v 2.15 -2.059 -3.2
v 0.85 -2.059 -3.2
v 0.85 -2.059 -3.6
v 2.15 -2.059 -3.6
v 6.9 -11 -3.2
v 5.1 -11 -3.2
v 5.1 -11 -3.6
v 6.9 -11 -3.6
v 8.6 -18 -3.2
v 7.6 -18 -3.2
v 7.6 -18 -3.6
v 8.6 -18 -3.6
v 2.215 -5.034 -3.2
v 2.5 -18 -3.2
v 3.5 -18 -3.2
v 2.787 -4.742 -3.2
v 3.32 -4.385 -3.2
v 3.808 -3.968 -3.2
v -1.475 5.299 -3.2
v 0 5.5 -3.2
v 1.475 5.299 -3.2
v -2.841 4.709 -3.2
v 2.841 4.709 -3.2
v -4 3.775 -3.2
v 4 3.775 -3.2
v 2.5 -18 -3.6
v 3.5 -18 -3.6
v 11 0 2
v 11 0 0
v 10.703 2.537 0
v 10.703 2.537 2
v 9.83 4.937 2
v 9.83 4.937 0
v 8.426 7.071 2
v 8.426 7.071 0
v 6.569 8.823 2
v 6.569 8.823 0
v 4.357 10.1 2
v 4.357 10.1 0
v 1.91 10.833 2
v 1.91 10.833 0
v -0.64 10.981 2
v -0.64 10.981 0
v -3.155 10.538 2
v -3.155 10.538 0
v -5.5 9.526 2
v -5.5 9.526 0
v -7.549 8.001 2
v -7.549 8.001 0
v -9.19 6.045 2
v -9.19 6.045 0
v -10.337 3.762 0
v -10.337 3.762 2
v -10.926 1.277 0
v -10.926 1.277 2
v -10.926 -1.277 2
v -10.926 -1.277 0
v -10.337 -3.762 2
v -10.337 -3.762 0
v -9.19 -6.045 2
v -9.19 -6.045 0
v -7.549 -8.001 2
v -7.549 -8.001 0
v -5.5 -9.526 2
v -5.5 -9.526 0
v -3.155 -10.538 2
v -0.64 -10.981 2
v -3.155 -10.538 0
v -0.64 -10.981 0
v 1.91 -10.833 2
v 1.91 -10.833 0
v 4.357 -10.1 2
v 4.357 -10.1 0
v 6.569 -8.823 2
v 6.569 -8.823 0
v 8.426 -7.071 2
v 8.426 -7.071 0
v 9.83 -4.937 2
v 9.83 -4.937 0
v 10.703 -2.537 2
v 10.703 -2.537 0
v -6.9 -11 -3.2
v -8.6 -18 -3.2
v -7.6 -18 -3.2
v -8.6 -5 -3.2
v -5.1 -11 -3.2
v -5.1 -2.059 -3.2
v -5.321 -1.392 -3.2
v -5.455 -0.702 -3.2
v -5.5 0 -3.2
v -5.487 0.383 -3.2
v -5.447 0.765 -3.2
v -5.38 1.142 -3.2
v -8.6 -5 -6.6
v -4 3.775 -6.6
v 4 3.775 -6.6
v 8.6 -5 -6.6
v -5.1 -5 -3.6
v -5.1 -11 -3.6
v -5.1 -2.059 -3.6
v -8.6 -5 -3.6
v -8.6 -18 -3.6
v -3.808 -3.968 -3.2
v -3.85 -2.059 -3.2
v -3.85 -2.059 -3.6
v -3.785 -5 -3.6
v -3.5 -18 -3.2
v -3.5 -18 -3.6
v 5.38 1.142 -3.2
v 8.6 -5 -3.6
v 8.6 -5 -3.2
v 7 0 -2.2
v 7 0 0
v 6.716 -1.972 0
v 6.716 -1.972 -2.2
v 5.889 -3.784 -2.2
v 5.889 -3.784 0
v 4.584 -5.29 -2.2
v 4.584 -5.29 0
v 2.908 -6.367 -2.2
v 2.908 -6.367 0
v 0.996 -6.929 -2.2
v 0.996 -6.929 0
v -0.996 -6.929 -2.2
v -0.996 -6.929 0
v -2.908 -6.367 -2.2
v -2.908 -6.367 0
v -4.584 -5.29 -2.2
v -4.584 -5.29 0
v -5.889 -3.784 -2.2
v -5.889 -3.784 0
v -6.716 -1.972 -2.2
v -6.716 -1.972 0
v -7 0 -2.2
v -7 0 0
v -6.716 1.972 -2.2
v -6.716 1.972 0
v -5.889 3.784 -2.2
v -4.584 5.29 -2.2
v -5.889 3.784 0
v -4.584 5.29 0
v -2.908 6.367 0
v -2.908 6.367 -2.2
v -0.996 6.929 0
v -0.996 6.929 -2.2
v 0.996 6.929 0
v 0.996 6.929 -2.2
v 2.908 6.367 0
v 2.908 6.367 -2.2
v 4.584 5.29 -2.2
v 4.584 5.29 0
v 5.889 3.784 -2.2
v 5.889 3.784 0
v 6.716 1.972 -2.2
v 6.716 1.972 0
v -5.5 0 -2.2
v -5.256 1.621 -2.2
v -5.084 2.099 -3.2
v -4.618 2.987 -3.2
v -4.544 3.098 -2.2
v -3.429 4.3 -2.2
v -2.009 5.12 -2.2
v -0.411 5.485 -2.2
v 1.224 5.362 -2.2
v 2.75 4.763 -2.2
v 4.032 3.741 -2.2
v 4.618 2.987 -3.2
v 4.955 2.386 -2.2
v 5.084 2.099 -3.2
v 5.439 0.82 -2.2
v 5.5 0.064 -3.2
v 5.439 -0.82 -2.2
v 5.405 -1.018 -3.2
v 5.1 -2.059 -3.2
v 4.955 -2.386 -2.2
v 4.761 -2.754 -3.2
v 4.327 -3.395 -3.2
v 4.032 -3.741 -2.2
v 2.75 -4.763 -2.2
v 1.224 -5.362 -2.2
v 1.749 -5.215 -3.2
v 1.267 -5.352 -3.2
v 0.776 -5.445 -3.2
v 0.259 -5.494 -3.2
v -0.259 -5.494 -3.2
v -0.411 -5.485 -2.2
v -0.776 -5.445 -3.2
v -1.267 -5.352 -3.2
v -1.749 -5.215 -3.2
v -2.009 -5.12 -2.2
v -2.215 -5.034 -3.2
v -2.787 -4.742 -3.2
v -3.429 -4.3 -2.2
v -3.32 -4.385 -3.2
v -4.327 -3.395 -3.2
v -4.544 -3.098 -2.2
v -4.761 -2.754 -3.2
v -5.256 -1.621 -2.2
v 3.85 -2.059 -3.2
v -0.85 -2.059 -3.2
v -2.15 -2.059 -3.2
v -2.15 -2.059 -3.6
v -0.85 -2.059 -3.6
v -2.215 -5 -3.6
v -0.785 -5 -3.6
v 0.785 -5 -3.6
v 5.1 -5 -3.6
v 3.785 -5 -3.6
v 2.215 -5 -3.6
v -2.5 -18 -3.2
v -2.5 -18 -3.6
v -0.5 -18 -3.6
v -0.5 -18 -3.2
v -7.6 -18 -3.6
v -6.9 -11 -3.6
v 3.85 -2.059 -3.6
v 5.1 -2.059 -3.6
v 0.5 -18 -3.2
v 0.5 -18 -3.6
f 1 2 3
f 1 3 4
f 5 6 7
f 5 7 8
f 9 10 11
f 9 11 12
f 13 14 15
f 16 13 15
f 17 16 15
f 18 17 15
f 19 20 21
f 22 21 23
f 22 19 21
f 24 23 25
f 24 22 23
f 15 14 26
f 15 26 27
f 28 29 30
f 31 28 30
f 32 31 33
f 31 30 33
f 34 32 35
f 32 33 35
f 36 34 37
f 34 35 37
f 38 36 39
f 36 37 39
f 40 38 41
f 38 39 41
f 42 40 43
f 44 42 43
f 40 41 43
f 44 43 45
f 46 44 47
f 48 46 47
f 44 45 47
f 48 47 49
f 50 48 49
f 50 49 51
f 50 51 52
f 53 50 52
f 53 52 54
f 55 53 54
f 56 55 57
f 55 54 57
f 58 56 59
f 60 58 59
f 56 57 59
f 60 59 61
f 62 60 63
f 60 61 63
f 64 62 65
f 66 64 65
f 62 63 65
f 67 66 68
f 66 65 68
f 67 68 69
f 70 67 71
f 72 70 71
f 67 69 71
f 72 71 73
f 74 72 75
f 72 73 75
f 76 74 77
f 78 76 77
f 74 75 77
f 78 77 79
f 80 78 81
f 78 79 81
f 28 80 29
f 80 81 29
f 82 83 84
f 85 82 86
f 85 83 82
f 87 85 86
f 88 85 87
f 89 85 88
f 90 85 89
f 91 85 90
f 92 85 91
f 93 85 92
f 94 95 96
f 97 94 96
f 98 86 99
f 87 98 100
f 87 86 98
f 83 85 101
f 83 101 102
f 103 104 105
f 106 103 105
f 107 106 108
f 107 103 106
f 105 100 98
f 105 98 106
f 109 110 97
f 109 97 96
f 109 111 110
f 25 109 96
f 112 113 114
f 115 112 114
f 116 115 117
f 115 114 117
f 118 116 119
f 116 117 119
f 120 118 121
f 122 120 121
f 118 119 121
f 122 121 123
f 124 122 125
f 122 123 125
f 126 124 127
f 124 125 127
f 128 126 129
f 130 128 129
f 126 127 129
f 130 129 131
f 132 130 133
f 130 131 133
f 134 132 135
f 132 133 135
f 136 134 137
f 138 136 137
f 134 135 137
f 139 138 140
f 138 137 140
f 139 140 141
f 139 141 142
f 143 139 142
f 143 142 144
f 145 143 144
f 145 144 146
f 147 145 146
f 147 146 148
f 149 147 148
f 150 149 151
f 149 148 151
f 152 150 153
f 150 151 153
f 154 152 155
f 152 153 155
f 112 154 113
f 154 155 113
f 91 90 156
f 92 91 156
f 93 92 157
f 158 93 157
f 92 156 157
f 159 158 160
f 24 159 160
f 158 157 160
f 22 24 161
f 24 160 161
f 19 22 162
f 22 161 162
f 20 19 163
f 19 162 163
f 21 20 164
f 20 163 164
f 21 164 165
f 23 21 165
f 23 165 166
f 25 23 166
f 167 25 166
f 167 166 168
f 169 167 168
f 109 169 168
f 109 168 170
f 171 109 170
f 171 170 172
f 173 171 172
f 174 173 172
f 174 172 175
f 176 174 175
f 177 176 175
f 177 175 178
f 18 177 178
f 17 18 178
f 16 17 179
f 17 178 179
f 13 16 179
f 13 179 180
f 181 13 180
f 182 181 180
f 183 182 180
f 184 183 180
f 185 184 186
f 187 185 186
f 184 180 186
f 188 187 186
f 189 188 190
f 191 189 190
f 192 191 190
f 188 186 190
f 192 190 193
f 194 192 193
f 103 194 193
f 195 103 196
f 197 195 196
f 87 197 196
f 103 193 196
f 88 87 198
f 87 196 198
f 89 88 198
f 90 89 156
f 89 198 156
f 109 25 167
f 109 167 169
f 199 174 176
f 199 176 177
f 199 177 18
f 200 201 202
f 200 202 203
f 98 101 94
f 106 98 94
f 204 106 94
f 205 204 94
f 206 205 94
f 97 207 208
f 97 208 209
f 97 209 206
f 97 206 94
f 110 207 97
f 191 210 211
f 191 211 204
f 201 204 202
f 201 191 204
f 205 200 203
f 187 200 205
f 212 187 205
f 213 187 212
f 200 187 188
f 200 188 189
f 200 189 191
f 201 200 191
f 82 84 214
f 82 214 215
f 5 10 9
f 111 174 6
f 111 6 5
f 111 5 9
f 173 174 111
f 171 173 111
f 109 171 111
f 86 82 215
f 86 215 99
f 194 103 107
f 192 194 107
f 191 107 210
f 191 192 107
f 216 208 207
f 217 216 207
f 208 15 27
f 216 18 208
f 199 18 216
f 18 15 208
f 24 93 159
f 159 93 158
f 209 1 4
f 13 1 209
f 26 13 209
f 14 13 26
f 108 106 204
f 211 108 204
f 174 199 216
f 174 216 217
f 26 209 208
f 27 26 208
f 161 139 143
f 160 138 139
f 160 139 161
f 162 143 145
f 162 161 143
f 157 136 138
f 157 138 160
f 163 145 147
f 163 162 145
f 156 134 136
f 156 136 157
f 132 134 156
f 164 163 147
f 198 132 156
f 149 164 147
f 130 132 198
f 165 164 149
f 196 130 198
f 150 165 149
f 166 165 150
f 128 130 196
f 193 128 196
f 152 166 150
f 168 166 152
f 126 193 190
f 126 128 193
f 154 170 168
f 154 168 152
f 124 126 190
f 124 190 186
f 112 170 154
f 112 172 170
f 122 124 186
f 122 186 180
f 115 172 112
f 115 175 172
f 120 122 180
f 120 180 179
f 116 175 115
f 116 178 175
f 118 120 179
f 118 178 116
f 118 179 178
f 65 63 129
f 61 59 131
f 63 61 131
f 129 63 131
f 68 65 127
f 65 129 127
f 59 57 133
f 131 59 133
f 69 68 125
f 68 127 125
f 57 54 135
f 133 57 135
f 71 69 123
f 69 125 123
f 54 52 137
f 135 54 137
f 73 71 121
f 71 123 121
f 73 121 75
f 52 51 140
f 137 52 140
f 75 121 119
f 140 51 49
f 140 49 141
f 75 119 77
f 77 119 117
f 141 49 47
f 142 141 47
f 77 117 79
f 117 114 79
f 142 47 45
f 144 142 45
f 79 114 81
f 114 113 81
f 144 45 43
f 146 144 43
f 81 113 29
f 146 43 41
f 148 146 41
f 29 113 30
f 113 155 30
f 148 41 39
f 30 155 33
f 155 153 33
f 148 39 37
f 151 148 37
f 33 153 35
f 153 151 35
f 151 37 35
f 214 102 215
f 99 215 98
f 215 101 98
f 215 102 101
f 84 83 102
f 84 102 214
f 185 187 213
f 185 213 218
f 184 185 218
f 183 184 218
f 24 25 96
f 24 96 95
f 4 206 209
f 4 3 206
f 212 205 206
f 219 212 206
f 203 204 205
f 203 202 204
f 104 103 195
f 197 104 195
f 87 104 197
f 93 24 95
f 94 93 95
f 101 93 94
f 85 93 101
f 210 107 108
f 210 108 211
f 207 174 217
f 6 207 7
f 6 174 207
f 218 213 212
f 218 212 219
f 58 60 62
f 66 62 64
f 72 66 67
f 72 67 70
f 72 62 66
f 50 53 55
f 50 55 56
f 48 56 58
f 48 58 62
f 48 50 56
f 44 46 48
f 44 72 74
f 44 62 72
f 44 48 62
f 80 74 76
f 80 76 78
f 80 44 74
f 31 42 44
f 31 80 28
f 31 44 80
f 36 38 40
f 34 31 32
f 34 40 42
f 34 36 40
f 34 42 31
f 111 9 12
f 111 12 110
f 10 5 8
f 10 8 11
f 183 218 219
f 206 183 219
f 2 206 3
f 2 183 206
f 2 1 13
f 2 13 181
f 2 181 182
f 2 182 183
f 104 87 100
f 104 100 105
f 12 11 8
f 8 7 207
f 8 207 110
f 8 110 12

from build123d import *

# Parameters (mm, degrees)
SKETCH1_R           = 11
BOSS_EXTRUDE1_DEPTH = 2
SKETCH2_R           = 7
BOSS_EXTRUDE2_DEPTH = 2.2
SKETCH3_R           = 5.5
BOSS_EXTRUDE3_DEPTH = 1
BOSS_EXTRUDE4_DEPTH = 0.4
BOSS_EXTRUDE5_DEPTH = 3


with BuildPart() as part:
    # Sketch1 → Boss-Extrude1 (new body)
    with BuildSketch(Plane.XY):
        Circle(SKETCH1_R)
    extrude(amount=BOSS_EXTRUDE1_DEPTH)

    # Sketch2 → Boss-Extrude2 (add)
    with BuildSketch(Plane(origin=(0, 0, 0), x_dir=(-1, 0, 0), z_dir=(0, 0, -1))):
        with Locations(Location((0, 0, 0), (0, 0, 180))):
            Circle(SKETCH2_R)
    extrude(amount=BOSS_EXTRUDE2_DEPTH)

    # Sketch3 → Boss-Extrude3 (add)
    with BuildSketch(Plane(origin=(0, 0, -2.2), x_dir=(-1, 0, 0), z_dir=(0, 0, -1))):
        Circle(SKETCH3_R)
    extrude(amount=BOSS_EXTRUDE3_DEPTH)

    # Sketch4 → Boss-Extrude4 (add)
    with BuildSketch(Plane(origin=(0, 0, -3.2), x_dir=(-1, 0, 0), z_dir=(0, 0, -1))):
        Polygon((-4, 3.774917218), (4, 3.774917218), (8.6, -5), (8.6, -18), (7.6, -18), (6.9, -11), (5.1, -11), (5.1, -2.059126028), (3.85, -2.059126028), (3.5, -18), (2.5, -18), (2.15, -2.059126028), (0.85, -2.059126028), (0.5, -18), (-0.5, -18), (-0.85, -2.059126028), (-2.15, -2.059126028), (-2.5, -18), (-3.5, -18), (-3.85, -2.059126028), (-5.1, -2.059126028), (-5.1, -11), (-6.9, -11), (-7.6, -18), (-8.6, -18), (-8.6, -5), align=None)
    extrude(amount=BOSS_EXTRUDE4_DEPTH)

    # Sketch5 → Boss-Extrude5 (add)
    with BuildSketch(Plane(origin=(0, 0, -3.6), x_dir=(-1, 0, 0), z_dir=(0, 0, -1))):
        Polygon((-8.6, -5), (-4, 3.774917218), (4, 3.774917218), (8.6, -5), align=None)
    extrude(amount=BOSS_EXTRUDE5_DEPTH)


solid = part.part
